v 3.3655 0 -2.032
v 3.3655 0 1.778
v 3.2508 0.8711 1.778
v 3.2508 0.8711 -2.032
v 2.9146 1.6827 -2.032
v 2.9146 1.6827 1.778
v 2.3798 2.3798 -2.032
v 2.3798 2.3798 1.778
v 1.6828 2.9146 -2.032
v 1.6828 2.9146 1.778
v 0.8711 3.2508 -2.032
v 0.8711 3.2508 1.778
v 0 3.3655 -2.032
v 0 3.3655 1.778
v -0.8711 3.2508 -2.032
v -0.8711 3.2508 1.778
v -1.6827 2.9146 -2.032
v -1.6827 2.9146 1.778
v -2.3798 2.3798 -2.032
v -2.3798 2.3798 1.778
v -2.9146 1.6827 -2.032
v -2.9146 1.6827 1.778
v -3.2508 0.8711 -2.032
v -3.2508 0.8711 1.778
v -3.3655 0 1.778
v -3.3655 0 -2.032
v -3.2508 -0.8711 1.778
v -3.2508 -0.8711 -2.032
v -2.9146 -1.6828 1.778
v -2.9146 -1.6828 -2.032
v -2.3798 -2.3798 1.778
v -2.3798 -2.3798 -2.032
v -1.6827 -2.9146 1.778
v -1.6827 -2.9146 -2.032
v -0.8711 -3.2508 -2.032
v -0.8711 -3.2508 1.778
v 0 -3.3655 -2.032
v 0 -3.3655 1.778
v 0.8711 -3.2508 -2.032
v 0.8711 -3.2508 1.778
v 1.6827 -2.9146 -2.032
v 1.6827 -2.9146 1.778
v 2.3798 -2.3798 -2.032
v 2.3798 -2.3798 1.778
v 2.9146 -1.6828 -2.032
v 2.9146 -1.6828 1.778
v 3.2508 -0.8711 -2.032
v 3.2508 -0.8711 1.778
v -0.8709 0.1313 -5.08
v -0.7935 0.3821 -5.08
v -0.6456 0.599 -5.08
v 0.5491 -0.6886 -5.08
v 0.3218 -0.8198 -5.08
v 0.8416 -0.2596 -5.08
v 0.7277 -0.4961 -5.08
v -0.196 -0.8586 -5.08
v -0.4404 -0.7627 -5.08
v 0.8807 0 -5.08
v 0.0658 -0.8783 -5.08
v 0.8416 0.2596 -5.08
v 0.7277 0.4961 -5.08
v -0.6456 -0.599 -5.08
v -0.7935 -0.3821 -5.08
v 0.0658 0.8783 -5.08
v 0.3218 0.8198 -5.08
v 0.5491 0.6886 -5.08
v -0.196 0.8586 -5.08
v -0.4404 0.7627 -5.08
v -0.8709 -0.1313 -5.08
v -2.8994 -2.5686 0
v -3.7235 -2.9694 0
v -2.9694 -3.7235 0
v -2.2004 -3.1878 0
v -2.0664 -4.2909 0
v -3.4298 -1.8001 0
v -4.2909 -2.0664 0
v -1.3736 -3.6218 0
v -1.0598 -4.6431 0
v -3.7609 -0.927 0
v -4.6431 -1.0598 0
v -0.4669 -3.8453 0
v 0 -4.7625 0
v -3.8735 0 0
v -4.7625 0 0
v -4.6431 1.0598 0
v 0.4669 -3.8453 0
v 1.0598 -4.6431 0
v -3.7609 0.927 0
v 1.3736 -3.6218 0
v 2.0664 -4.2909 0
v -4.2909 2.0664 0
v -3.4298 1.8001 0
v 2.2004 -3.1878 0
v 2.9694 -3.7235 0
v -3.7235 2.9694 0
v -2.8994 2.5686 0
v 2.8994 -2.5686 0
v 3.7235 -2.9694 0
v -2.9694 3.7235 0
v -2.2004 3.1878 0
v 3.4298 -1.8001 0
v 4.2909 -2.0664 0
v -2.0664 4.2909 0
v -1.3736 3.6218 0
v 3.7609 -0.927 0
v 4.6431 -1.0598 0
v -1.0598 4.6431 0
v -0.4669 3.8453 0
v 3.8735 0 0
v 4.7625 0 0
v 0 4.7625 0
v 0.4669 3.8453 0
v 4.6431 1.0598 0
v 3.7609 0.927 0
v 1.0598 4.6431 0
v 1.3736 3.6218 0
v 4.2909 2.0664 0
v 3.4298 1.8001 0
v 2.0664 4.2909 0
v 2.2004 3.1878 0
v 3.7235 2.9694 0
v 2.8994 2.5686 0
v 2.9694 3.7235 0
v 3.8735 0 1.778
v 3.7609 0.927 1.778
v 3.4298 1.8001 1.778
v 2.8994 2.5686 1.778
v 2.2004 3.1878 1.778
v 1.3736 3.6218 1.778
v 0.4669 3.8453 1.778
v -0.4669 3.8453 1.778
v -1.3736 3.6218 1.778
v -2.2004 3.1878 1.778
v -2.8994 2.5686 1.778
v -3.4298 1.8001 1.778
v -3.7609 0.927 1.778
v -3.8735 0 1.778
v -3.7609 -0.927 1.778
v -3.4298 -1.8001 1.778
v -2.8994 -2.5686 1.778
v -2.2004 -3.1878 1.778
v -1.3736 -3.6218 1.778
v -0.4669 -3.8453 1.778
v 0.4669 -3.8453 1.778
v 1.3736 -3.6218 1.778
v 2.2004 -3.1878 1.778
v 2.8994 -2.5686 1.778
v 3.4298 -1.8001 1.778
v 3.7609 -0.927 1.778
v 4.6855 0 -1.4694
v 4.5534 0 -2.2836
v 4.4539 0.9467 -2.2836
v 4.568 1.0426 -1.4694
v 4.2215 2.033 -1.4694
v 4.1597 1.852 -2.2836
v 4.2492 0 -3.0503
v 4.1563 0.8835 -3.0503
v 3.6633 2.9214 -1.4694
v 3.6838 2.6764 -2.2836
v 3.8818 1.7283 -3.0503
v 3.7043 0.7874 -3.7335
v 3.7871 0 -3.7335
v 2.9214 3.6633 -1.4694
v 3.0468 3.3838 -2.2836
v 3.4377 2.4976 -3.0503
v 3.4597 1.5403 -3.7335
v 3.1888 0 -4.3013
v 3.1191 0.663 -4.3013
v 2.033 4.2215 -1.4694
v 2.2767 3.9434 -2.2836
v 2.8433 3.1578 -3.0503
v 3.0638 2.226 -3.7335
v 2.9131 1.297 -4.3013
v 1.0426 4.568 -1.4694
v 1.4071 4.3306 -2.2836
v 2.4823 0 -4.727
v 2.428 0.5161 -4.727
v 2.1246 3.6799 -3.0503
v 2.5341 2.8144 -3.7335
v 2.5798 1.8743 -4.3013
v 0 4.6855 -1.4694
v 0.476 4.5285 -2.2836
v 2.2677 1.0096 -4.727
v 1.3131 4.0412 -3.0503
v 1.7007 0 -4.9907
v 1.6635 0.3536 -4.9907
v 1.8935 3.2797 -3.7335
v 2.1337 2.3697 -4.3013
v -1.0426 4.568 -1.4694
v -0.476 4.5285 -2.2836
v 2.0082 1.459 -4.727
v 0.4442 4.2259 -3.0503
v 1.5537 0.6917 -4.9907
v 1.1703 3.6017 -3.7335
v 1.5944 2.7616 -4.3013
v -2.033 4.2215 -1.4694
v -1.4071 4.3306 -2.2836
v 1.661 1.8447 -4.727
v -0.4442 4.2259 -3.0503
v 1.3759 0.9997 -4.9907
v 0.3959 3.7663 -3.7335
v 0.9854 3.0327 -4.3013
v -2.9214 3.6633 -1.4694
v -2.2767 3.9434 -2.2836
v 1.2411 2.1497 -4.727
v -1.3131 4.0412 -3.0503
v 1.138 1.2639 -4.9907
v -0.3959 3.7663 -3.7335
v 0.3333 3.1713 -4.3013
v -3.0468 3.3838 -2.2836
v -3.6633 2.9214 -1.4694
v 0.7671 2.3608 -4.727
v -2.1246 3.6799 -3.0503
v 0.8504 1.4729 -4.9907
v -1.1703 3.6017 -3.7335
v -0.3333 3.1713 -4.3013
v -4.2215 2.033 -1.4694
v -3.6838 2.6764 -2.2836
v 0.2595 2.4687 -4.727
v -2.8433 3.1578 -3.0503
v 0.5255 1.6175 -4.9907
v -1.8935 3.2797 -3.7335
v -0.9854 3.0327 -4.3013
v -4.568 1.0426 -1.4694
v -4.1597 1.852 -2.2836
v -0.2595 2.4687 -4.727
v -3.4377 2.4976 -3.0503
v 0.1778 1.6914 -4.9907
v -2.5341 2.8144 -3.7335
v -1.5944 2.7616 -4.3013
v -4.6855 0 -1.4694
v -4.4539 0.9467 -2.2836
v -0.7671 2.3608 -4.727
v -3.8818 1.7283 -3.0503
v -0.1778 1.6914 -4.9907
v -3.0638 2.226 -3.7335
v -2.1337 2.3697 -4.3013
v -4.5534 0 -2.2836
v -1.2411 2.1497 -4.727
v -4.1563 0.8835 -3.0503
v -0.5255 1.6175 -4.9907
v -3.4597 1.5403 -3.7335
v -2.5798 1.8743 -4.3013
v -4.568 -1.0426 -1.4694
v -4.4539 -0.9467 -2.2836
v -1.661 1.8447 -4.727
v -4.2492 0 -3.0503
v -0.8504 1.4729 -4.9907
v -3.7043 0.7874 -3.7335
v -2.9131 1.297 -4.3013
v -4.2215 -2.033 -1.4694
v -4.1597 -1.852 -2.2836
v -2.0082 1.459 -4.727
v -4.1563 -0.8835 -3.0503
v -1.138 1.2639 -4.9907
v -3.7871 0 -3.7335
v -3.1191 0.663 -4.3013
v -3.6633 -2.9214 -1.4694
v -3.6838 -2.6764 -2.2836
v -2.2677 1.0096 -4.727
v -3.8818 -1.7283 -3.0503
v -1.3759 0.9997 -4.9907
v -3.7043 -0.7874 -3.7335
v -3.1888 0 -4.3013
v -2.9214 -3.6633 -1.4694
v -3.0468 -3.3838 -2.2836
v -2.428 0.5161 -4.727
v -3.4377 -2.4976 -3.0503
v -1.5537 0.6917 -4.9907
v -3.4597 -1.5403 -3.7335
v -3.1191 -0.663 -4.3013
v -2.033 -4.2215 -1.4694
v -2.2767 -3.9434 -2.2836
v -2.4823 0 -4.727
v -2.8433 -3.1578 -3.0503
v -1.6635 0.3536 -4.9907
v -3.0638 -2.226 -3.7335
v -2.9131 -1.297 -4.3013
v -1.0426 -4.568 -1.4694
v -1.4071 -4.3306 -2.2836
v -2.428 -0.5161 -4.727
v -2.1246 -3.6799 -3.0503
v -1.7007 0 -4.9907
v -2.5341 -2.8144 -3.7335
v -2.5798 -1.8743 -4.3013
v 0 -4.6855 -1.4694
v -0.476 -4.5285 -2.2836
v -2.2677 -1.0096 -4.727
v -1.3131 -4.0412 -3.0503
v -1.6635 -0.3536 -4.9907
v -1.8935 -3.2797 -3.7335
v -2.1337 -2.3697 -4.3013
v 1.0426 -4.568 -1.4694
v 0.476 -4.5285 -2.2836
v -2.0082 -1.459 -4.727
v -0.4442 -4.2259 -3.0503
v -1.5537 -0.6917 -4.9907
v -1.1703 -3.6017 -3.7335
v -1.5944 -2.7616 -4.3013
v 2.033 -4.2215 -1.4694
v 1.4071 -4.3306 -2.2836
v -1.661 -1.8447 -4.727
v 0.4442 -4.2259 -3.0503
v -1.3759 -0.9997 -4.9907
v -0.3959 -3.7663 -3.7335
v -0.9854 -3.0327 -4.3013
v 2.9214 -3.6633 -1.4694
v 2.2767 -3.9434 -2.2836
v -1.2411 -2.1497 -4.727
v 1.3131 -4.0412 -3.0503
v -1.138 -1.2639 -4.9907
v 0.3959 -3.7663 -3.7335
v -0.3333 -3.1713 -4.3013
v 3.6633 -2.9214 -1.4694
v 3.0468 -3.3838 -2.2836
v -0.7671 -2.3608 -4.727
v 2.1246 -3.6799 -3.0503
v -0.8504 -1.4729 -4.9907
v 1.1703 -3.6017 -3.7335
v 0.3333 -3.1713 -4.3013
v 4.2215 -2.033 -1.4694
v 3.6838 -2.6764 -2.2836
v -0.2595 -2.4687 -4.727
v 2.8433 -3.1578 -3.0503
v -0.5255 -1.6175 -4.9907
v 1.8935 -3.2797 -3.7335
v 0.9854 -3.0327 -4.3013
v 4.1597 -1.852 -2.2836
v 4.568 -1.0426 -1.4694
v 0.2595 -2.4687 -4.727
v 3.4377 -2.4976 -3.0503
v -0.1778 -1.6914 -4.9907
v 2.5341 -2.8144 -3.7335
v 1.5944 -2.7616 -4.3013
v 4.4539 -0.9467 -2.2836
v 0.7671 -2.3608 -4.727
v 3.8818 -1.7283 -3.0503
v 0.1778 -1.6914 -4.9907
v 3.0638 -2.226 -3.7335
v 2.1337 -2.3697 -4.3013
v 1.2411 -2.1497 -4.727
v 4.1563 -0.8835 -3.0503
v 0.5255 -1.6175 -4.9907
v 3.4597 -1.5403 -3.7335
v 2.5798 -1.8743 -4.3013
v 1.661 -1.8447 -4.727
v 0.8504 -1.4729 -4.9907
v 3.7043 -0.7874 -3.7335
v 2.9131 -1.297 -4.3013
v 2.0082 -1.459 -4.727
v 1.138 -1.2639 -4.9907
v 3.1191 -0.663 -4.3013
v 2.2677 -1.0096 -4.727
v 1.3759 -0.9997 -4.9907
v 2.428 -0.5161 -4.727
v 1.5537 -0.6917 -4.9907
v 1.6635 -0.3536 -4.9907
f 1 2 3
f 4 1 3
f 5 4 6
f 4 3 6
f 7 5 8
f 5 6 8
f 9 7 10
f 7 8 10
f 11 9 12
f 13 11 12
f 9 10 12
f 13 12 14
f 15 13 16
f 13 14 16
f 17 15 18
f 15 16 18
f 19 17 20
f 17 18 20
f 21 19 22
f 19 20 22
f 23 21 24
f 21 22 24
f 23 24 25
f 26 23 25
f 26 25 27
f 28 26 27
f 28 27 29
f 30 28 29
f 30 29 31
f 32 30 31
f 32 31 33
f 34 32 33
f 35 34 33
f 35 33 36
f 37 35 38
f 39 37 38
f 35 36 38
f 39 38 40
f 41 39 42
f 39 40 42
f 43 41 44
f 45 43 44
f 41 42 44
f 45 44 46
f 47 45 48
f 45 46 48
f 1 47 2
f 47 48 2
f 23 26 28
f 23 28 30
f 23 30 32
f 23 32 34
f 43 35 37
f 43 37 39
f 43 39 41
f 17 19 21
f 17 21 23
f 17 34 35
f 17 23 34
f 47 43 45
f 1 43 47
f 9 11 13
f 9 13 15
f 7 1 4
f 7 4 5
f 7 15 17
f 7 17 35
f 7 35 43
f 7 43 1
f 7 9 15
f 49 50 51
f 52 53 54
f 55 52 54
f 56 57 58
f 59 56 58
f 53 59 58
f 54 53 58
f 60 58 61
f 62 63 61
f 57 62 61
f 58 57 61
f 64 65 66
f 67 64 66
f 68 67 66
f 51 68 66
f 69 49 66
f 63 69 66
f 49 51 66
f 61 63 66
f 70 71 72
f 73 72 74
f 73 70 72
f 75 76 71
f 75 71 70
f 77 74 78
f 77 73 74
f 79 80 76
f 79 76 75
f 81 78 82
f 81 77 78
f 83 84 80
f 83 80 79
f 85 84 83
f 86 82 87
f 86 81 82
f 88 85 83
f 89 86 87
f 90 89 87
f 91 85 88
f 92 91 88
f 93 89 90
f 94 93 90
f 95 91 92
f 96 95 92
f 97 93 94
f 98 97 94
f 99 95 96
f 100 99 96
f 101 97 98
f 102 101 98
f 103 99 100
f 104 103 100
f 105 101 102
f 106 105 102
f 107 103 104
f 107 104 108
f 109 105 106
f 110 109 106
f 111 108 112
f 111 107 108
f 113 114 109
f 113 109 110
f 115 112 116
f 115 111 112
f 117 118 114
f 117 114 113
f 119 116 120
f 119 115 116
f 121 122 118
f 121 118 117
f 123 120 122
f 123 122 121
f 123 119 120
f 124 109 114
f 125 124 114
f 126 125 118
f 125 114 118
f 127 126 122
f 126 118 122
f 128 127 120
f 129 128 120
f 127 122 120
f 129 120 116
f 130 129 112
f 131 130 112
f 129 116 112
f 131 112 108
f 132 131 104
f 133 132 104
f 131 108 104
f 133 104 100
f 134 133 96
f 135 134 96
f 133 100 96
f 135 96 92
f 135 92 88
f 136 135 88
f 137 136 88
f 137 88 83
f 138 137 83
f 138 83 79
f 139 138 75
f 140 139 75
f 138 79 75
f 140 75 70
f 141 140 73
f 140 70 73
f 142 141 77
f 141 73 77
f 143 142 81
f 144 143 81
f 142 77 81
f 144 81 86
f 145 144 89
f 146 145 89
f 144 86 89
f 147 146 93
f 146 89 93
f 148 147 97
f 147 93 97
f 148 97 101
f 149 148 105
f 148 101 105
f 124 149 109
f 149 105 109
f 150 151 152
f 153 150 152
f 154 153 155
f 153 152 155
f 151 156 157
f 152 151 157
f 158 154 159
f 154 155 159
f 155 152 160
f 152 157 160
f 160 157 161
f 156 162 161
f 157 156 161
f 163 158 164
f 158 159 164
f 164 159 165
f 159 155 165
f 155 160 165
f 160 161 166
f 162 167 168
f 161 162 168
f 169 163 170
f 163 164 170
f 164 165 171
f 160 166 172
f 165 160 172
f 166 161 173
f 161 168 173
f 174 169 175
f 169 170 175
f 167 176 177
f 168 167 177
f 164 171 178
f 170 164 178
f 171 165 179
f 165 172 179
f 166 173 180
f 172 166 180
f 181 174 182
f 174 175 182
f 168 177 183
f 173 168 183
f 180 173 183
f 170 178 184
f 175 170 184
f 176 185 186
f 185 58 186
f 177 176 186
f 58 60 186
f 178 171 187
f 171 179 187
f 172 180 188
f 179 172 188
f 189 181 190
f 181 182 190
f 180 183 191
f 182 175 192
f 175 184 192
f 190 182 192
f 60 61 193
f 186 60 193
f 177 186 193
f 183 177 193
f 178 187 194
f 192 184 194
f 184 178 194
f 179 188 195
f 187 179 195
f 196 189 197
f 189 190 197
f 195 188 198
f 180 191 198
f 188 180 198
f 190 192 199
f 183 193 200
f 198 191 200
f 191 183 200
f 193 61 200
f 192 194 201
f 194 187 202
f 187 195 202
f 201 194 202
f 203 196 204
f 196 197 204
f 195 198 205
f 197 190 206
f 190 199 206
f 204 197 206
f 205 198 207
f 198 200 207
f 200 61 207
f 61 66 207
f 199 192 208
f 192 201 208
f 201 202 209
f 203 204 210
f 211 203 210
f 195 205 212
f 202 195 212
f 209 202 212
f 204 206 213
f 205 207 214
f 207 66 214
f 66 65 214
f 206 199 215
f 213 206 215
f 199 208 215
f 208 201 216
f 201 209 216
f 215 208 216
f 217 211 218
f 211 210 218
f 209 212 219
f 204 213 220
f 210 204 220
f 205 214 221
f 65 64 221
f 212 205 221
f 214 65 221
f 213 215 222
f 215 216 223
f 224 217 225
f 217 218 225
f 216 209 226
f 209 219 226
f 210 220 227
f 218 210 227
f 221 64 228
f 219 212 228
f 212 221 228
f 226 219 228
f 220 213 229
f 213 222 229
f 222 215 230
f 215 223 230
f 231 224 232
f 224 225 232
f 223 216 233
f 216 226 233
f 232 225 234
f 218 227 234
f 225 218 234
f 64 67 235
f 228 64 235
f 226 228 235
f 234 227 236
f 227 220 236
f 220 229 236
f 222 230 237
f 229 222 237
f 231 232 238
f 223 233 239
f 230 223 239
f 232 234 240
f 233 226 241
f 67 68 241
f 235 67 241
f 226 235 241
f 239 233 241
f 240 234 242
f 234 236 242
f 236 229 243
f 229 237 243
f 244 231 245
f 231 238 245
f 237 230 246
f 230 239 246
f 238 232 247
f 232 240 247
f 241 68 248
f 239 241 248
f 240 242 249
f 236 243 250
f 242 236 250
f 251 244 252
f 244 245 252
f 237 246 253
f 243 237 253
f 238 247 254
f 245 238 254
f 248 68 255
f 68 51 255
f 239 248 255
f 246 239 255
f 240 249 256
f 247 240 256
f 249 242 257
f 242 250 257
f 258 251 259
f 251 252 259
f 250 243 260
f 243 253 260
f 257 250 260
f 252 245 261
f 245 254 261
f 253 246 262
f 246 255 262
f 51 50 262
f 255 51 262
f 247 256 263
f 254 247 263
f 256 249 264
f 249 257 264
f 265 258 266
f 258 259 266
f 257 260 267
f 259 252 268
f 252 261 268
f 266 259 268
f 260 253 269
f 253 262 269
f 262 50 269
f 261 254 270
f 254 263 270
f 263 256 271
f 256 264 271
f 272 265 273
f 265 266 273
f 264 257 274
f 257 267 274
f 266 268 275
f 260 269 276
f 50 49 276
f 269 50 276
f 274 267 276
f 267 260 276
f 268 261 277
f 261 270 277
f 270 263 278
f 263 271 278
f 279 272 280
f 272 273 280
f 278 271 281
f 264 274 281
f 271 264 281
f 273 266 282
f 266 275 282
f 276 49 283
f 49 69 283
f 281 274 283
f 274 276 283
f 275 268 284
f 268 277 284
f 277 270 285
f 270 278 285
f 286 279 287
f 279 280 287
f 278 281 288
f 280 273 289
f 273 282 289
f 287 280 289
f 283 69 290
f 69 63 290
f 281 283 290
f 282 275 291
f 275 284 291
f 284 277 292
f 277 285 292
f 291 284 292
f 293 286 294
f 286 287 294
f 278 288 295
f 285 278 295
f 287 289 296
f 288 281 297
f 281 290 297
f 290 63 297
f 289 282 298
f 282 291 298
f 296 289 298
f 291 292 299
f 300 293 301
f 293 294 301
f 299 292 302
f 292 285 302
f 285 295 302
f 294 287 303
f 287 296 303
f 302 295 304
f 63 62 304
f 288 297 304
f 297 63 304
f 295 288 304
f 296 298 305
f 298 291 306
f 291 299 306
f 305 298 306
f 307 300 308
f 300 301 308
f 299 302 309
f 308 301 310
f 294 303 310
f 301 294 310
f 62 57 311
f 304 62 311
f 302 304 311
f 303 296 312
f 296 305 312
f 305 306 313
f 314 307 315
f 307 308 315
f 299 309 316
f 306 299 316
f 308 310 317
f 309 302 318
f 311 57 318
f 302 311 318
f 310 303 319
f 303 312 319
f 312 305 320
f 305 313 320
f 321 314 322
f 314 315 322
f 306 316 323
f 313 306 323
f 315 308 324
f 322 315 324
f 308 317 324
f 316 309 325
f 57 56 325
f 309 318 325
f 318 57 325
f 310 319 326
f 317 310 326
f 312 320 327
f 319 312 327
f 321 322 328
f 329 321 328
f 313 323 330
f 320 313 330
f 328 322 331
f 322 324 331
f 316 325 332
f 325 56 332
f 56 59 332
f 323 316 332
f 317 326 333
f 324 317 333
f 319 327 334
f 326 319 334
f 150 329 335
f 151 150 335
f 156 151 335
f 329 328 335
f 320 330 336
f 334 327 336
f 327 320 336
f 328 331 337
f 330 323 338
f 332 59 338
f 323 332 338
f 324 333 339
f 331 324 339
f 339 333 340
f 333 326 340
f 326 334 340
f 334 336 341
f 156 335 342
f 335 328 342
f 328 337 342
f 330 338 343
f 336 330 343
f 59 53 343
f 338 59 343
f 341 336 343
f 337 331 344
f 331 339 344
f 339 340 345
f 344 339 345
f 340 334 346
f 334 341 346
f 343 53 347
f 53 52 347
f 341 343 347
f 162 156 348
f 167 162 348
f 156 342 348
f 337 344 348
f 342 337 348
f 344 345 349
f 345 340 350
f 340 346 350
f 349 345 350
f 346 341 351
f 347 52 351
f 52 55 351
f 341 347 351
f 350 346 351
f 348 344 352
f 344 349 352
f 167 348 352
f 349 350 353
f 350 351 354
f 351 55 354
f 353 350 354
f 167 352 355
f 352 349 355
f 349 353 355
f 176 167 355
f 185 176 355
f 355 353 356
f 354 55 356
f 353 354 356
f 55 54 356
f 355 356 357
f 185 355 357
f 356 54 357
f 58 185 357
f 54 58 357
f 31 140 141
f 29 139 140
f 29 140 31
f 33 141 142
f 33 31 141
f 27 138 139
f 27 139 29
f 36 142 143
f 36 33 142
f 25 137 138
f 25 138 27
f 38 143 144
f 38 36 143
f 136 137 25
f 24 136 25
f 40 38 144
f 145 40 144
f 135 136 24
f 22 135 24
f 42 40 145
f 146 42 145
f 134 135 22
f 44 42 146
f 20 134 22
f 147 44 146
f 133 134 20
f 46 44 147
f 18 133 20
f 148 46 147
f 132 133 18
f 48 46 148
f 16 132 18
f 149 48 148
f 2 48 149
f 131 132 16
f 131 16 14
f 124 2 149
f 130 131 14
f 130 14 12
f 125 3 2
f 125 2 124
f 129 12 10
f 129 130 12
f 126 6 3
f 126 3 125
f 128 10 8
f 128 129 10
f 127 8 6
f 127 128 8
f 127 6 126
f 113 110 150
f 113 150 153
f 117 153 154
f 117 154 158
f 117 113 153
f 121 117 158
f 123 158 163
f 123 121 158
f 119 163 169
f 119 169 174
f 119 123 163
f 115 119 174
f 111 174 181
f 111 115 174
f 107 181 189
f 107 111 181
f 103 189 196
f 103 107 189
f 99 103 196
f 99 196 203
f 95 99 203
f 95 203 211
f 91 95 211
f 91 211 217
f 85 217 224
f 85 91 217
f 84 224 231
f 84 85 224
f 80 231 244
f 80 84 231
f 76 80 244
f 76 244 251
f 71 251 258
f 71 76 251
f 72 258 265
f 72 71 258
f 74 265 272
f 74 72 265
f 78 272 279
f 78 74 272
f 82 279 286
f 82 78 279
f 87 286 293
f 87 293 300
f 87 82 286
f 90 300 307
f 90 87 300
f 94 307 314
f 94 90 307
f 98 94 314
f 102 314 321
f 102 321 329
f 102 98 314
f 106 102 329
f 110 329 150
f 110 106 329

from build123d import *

# Parameters (mm, degrees)
SKETCH1_R           = 4.7625
BASE_EXTRUDE_DEPTH  = 5.08
BASE_EXTRUDE_DRAFT  = -3
FILLET3_R           = 3.81
SKETCH2_R           = 3.8735
BOSS_EXTRUDE1_DEPTH = 1.778
SKETCH3_R           = 3.3655
CUT_EXTRUDE1_DEPTH  = 3.81


with BuildPart() as part:
    # Sketch1 → Base-Extrude (with draft: the straight prism first)
    with BuildSketch(Plane.XY):
        Circle(SKETCH1_R)
    extrude(amount=-BASE_EXTRUDE_DEPTH)
    # Base-Extrude: the draft: its side faces are tilted about the plane it starts from
    base_extrude_sides = [part.faces().sort_by_distance(p)[0] for p in [
        (-4.7625, 0, -2.54),
    ]]
    draft(base_extrude_sides, Plane.XY, BASE_EXTRUDE_DRAFT)

    # Fillet3
    fillet3_edges = [part.edges().sort_by_distance(p)[0] for p in [
        (-4.496268481, 0, -5.08),
    ]]
    fillet(fillet3_edges, radius=FILLET3_R)

    # Sketch2 → Boss-Extrude1 (add)
    with BuildSketch(Plane.XY):
        Circle(SKETCH2_R)
    extrude(amount=BOSS_EXTRUDE1_DEPTH)

    # Sketch3 → Cut-Extrude1 (cut)
    with BuildSketch(Plane.XY.offset(1.778)):
        Circle(SKETCH3_R)
    extrude(amount=-CUT_EXTRUDE1_DEPTH, mode=Mode.SUBTRACT)


solid = part.part
